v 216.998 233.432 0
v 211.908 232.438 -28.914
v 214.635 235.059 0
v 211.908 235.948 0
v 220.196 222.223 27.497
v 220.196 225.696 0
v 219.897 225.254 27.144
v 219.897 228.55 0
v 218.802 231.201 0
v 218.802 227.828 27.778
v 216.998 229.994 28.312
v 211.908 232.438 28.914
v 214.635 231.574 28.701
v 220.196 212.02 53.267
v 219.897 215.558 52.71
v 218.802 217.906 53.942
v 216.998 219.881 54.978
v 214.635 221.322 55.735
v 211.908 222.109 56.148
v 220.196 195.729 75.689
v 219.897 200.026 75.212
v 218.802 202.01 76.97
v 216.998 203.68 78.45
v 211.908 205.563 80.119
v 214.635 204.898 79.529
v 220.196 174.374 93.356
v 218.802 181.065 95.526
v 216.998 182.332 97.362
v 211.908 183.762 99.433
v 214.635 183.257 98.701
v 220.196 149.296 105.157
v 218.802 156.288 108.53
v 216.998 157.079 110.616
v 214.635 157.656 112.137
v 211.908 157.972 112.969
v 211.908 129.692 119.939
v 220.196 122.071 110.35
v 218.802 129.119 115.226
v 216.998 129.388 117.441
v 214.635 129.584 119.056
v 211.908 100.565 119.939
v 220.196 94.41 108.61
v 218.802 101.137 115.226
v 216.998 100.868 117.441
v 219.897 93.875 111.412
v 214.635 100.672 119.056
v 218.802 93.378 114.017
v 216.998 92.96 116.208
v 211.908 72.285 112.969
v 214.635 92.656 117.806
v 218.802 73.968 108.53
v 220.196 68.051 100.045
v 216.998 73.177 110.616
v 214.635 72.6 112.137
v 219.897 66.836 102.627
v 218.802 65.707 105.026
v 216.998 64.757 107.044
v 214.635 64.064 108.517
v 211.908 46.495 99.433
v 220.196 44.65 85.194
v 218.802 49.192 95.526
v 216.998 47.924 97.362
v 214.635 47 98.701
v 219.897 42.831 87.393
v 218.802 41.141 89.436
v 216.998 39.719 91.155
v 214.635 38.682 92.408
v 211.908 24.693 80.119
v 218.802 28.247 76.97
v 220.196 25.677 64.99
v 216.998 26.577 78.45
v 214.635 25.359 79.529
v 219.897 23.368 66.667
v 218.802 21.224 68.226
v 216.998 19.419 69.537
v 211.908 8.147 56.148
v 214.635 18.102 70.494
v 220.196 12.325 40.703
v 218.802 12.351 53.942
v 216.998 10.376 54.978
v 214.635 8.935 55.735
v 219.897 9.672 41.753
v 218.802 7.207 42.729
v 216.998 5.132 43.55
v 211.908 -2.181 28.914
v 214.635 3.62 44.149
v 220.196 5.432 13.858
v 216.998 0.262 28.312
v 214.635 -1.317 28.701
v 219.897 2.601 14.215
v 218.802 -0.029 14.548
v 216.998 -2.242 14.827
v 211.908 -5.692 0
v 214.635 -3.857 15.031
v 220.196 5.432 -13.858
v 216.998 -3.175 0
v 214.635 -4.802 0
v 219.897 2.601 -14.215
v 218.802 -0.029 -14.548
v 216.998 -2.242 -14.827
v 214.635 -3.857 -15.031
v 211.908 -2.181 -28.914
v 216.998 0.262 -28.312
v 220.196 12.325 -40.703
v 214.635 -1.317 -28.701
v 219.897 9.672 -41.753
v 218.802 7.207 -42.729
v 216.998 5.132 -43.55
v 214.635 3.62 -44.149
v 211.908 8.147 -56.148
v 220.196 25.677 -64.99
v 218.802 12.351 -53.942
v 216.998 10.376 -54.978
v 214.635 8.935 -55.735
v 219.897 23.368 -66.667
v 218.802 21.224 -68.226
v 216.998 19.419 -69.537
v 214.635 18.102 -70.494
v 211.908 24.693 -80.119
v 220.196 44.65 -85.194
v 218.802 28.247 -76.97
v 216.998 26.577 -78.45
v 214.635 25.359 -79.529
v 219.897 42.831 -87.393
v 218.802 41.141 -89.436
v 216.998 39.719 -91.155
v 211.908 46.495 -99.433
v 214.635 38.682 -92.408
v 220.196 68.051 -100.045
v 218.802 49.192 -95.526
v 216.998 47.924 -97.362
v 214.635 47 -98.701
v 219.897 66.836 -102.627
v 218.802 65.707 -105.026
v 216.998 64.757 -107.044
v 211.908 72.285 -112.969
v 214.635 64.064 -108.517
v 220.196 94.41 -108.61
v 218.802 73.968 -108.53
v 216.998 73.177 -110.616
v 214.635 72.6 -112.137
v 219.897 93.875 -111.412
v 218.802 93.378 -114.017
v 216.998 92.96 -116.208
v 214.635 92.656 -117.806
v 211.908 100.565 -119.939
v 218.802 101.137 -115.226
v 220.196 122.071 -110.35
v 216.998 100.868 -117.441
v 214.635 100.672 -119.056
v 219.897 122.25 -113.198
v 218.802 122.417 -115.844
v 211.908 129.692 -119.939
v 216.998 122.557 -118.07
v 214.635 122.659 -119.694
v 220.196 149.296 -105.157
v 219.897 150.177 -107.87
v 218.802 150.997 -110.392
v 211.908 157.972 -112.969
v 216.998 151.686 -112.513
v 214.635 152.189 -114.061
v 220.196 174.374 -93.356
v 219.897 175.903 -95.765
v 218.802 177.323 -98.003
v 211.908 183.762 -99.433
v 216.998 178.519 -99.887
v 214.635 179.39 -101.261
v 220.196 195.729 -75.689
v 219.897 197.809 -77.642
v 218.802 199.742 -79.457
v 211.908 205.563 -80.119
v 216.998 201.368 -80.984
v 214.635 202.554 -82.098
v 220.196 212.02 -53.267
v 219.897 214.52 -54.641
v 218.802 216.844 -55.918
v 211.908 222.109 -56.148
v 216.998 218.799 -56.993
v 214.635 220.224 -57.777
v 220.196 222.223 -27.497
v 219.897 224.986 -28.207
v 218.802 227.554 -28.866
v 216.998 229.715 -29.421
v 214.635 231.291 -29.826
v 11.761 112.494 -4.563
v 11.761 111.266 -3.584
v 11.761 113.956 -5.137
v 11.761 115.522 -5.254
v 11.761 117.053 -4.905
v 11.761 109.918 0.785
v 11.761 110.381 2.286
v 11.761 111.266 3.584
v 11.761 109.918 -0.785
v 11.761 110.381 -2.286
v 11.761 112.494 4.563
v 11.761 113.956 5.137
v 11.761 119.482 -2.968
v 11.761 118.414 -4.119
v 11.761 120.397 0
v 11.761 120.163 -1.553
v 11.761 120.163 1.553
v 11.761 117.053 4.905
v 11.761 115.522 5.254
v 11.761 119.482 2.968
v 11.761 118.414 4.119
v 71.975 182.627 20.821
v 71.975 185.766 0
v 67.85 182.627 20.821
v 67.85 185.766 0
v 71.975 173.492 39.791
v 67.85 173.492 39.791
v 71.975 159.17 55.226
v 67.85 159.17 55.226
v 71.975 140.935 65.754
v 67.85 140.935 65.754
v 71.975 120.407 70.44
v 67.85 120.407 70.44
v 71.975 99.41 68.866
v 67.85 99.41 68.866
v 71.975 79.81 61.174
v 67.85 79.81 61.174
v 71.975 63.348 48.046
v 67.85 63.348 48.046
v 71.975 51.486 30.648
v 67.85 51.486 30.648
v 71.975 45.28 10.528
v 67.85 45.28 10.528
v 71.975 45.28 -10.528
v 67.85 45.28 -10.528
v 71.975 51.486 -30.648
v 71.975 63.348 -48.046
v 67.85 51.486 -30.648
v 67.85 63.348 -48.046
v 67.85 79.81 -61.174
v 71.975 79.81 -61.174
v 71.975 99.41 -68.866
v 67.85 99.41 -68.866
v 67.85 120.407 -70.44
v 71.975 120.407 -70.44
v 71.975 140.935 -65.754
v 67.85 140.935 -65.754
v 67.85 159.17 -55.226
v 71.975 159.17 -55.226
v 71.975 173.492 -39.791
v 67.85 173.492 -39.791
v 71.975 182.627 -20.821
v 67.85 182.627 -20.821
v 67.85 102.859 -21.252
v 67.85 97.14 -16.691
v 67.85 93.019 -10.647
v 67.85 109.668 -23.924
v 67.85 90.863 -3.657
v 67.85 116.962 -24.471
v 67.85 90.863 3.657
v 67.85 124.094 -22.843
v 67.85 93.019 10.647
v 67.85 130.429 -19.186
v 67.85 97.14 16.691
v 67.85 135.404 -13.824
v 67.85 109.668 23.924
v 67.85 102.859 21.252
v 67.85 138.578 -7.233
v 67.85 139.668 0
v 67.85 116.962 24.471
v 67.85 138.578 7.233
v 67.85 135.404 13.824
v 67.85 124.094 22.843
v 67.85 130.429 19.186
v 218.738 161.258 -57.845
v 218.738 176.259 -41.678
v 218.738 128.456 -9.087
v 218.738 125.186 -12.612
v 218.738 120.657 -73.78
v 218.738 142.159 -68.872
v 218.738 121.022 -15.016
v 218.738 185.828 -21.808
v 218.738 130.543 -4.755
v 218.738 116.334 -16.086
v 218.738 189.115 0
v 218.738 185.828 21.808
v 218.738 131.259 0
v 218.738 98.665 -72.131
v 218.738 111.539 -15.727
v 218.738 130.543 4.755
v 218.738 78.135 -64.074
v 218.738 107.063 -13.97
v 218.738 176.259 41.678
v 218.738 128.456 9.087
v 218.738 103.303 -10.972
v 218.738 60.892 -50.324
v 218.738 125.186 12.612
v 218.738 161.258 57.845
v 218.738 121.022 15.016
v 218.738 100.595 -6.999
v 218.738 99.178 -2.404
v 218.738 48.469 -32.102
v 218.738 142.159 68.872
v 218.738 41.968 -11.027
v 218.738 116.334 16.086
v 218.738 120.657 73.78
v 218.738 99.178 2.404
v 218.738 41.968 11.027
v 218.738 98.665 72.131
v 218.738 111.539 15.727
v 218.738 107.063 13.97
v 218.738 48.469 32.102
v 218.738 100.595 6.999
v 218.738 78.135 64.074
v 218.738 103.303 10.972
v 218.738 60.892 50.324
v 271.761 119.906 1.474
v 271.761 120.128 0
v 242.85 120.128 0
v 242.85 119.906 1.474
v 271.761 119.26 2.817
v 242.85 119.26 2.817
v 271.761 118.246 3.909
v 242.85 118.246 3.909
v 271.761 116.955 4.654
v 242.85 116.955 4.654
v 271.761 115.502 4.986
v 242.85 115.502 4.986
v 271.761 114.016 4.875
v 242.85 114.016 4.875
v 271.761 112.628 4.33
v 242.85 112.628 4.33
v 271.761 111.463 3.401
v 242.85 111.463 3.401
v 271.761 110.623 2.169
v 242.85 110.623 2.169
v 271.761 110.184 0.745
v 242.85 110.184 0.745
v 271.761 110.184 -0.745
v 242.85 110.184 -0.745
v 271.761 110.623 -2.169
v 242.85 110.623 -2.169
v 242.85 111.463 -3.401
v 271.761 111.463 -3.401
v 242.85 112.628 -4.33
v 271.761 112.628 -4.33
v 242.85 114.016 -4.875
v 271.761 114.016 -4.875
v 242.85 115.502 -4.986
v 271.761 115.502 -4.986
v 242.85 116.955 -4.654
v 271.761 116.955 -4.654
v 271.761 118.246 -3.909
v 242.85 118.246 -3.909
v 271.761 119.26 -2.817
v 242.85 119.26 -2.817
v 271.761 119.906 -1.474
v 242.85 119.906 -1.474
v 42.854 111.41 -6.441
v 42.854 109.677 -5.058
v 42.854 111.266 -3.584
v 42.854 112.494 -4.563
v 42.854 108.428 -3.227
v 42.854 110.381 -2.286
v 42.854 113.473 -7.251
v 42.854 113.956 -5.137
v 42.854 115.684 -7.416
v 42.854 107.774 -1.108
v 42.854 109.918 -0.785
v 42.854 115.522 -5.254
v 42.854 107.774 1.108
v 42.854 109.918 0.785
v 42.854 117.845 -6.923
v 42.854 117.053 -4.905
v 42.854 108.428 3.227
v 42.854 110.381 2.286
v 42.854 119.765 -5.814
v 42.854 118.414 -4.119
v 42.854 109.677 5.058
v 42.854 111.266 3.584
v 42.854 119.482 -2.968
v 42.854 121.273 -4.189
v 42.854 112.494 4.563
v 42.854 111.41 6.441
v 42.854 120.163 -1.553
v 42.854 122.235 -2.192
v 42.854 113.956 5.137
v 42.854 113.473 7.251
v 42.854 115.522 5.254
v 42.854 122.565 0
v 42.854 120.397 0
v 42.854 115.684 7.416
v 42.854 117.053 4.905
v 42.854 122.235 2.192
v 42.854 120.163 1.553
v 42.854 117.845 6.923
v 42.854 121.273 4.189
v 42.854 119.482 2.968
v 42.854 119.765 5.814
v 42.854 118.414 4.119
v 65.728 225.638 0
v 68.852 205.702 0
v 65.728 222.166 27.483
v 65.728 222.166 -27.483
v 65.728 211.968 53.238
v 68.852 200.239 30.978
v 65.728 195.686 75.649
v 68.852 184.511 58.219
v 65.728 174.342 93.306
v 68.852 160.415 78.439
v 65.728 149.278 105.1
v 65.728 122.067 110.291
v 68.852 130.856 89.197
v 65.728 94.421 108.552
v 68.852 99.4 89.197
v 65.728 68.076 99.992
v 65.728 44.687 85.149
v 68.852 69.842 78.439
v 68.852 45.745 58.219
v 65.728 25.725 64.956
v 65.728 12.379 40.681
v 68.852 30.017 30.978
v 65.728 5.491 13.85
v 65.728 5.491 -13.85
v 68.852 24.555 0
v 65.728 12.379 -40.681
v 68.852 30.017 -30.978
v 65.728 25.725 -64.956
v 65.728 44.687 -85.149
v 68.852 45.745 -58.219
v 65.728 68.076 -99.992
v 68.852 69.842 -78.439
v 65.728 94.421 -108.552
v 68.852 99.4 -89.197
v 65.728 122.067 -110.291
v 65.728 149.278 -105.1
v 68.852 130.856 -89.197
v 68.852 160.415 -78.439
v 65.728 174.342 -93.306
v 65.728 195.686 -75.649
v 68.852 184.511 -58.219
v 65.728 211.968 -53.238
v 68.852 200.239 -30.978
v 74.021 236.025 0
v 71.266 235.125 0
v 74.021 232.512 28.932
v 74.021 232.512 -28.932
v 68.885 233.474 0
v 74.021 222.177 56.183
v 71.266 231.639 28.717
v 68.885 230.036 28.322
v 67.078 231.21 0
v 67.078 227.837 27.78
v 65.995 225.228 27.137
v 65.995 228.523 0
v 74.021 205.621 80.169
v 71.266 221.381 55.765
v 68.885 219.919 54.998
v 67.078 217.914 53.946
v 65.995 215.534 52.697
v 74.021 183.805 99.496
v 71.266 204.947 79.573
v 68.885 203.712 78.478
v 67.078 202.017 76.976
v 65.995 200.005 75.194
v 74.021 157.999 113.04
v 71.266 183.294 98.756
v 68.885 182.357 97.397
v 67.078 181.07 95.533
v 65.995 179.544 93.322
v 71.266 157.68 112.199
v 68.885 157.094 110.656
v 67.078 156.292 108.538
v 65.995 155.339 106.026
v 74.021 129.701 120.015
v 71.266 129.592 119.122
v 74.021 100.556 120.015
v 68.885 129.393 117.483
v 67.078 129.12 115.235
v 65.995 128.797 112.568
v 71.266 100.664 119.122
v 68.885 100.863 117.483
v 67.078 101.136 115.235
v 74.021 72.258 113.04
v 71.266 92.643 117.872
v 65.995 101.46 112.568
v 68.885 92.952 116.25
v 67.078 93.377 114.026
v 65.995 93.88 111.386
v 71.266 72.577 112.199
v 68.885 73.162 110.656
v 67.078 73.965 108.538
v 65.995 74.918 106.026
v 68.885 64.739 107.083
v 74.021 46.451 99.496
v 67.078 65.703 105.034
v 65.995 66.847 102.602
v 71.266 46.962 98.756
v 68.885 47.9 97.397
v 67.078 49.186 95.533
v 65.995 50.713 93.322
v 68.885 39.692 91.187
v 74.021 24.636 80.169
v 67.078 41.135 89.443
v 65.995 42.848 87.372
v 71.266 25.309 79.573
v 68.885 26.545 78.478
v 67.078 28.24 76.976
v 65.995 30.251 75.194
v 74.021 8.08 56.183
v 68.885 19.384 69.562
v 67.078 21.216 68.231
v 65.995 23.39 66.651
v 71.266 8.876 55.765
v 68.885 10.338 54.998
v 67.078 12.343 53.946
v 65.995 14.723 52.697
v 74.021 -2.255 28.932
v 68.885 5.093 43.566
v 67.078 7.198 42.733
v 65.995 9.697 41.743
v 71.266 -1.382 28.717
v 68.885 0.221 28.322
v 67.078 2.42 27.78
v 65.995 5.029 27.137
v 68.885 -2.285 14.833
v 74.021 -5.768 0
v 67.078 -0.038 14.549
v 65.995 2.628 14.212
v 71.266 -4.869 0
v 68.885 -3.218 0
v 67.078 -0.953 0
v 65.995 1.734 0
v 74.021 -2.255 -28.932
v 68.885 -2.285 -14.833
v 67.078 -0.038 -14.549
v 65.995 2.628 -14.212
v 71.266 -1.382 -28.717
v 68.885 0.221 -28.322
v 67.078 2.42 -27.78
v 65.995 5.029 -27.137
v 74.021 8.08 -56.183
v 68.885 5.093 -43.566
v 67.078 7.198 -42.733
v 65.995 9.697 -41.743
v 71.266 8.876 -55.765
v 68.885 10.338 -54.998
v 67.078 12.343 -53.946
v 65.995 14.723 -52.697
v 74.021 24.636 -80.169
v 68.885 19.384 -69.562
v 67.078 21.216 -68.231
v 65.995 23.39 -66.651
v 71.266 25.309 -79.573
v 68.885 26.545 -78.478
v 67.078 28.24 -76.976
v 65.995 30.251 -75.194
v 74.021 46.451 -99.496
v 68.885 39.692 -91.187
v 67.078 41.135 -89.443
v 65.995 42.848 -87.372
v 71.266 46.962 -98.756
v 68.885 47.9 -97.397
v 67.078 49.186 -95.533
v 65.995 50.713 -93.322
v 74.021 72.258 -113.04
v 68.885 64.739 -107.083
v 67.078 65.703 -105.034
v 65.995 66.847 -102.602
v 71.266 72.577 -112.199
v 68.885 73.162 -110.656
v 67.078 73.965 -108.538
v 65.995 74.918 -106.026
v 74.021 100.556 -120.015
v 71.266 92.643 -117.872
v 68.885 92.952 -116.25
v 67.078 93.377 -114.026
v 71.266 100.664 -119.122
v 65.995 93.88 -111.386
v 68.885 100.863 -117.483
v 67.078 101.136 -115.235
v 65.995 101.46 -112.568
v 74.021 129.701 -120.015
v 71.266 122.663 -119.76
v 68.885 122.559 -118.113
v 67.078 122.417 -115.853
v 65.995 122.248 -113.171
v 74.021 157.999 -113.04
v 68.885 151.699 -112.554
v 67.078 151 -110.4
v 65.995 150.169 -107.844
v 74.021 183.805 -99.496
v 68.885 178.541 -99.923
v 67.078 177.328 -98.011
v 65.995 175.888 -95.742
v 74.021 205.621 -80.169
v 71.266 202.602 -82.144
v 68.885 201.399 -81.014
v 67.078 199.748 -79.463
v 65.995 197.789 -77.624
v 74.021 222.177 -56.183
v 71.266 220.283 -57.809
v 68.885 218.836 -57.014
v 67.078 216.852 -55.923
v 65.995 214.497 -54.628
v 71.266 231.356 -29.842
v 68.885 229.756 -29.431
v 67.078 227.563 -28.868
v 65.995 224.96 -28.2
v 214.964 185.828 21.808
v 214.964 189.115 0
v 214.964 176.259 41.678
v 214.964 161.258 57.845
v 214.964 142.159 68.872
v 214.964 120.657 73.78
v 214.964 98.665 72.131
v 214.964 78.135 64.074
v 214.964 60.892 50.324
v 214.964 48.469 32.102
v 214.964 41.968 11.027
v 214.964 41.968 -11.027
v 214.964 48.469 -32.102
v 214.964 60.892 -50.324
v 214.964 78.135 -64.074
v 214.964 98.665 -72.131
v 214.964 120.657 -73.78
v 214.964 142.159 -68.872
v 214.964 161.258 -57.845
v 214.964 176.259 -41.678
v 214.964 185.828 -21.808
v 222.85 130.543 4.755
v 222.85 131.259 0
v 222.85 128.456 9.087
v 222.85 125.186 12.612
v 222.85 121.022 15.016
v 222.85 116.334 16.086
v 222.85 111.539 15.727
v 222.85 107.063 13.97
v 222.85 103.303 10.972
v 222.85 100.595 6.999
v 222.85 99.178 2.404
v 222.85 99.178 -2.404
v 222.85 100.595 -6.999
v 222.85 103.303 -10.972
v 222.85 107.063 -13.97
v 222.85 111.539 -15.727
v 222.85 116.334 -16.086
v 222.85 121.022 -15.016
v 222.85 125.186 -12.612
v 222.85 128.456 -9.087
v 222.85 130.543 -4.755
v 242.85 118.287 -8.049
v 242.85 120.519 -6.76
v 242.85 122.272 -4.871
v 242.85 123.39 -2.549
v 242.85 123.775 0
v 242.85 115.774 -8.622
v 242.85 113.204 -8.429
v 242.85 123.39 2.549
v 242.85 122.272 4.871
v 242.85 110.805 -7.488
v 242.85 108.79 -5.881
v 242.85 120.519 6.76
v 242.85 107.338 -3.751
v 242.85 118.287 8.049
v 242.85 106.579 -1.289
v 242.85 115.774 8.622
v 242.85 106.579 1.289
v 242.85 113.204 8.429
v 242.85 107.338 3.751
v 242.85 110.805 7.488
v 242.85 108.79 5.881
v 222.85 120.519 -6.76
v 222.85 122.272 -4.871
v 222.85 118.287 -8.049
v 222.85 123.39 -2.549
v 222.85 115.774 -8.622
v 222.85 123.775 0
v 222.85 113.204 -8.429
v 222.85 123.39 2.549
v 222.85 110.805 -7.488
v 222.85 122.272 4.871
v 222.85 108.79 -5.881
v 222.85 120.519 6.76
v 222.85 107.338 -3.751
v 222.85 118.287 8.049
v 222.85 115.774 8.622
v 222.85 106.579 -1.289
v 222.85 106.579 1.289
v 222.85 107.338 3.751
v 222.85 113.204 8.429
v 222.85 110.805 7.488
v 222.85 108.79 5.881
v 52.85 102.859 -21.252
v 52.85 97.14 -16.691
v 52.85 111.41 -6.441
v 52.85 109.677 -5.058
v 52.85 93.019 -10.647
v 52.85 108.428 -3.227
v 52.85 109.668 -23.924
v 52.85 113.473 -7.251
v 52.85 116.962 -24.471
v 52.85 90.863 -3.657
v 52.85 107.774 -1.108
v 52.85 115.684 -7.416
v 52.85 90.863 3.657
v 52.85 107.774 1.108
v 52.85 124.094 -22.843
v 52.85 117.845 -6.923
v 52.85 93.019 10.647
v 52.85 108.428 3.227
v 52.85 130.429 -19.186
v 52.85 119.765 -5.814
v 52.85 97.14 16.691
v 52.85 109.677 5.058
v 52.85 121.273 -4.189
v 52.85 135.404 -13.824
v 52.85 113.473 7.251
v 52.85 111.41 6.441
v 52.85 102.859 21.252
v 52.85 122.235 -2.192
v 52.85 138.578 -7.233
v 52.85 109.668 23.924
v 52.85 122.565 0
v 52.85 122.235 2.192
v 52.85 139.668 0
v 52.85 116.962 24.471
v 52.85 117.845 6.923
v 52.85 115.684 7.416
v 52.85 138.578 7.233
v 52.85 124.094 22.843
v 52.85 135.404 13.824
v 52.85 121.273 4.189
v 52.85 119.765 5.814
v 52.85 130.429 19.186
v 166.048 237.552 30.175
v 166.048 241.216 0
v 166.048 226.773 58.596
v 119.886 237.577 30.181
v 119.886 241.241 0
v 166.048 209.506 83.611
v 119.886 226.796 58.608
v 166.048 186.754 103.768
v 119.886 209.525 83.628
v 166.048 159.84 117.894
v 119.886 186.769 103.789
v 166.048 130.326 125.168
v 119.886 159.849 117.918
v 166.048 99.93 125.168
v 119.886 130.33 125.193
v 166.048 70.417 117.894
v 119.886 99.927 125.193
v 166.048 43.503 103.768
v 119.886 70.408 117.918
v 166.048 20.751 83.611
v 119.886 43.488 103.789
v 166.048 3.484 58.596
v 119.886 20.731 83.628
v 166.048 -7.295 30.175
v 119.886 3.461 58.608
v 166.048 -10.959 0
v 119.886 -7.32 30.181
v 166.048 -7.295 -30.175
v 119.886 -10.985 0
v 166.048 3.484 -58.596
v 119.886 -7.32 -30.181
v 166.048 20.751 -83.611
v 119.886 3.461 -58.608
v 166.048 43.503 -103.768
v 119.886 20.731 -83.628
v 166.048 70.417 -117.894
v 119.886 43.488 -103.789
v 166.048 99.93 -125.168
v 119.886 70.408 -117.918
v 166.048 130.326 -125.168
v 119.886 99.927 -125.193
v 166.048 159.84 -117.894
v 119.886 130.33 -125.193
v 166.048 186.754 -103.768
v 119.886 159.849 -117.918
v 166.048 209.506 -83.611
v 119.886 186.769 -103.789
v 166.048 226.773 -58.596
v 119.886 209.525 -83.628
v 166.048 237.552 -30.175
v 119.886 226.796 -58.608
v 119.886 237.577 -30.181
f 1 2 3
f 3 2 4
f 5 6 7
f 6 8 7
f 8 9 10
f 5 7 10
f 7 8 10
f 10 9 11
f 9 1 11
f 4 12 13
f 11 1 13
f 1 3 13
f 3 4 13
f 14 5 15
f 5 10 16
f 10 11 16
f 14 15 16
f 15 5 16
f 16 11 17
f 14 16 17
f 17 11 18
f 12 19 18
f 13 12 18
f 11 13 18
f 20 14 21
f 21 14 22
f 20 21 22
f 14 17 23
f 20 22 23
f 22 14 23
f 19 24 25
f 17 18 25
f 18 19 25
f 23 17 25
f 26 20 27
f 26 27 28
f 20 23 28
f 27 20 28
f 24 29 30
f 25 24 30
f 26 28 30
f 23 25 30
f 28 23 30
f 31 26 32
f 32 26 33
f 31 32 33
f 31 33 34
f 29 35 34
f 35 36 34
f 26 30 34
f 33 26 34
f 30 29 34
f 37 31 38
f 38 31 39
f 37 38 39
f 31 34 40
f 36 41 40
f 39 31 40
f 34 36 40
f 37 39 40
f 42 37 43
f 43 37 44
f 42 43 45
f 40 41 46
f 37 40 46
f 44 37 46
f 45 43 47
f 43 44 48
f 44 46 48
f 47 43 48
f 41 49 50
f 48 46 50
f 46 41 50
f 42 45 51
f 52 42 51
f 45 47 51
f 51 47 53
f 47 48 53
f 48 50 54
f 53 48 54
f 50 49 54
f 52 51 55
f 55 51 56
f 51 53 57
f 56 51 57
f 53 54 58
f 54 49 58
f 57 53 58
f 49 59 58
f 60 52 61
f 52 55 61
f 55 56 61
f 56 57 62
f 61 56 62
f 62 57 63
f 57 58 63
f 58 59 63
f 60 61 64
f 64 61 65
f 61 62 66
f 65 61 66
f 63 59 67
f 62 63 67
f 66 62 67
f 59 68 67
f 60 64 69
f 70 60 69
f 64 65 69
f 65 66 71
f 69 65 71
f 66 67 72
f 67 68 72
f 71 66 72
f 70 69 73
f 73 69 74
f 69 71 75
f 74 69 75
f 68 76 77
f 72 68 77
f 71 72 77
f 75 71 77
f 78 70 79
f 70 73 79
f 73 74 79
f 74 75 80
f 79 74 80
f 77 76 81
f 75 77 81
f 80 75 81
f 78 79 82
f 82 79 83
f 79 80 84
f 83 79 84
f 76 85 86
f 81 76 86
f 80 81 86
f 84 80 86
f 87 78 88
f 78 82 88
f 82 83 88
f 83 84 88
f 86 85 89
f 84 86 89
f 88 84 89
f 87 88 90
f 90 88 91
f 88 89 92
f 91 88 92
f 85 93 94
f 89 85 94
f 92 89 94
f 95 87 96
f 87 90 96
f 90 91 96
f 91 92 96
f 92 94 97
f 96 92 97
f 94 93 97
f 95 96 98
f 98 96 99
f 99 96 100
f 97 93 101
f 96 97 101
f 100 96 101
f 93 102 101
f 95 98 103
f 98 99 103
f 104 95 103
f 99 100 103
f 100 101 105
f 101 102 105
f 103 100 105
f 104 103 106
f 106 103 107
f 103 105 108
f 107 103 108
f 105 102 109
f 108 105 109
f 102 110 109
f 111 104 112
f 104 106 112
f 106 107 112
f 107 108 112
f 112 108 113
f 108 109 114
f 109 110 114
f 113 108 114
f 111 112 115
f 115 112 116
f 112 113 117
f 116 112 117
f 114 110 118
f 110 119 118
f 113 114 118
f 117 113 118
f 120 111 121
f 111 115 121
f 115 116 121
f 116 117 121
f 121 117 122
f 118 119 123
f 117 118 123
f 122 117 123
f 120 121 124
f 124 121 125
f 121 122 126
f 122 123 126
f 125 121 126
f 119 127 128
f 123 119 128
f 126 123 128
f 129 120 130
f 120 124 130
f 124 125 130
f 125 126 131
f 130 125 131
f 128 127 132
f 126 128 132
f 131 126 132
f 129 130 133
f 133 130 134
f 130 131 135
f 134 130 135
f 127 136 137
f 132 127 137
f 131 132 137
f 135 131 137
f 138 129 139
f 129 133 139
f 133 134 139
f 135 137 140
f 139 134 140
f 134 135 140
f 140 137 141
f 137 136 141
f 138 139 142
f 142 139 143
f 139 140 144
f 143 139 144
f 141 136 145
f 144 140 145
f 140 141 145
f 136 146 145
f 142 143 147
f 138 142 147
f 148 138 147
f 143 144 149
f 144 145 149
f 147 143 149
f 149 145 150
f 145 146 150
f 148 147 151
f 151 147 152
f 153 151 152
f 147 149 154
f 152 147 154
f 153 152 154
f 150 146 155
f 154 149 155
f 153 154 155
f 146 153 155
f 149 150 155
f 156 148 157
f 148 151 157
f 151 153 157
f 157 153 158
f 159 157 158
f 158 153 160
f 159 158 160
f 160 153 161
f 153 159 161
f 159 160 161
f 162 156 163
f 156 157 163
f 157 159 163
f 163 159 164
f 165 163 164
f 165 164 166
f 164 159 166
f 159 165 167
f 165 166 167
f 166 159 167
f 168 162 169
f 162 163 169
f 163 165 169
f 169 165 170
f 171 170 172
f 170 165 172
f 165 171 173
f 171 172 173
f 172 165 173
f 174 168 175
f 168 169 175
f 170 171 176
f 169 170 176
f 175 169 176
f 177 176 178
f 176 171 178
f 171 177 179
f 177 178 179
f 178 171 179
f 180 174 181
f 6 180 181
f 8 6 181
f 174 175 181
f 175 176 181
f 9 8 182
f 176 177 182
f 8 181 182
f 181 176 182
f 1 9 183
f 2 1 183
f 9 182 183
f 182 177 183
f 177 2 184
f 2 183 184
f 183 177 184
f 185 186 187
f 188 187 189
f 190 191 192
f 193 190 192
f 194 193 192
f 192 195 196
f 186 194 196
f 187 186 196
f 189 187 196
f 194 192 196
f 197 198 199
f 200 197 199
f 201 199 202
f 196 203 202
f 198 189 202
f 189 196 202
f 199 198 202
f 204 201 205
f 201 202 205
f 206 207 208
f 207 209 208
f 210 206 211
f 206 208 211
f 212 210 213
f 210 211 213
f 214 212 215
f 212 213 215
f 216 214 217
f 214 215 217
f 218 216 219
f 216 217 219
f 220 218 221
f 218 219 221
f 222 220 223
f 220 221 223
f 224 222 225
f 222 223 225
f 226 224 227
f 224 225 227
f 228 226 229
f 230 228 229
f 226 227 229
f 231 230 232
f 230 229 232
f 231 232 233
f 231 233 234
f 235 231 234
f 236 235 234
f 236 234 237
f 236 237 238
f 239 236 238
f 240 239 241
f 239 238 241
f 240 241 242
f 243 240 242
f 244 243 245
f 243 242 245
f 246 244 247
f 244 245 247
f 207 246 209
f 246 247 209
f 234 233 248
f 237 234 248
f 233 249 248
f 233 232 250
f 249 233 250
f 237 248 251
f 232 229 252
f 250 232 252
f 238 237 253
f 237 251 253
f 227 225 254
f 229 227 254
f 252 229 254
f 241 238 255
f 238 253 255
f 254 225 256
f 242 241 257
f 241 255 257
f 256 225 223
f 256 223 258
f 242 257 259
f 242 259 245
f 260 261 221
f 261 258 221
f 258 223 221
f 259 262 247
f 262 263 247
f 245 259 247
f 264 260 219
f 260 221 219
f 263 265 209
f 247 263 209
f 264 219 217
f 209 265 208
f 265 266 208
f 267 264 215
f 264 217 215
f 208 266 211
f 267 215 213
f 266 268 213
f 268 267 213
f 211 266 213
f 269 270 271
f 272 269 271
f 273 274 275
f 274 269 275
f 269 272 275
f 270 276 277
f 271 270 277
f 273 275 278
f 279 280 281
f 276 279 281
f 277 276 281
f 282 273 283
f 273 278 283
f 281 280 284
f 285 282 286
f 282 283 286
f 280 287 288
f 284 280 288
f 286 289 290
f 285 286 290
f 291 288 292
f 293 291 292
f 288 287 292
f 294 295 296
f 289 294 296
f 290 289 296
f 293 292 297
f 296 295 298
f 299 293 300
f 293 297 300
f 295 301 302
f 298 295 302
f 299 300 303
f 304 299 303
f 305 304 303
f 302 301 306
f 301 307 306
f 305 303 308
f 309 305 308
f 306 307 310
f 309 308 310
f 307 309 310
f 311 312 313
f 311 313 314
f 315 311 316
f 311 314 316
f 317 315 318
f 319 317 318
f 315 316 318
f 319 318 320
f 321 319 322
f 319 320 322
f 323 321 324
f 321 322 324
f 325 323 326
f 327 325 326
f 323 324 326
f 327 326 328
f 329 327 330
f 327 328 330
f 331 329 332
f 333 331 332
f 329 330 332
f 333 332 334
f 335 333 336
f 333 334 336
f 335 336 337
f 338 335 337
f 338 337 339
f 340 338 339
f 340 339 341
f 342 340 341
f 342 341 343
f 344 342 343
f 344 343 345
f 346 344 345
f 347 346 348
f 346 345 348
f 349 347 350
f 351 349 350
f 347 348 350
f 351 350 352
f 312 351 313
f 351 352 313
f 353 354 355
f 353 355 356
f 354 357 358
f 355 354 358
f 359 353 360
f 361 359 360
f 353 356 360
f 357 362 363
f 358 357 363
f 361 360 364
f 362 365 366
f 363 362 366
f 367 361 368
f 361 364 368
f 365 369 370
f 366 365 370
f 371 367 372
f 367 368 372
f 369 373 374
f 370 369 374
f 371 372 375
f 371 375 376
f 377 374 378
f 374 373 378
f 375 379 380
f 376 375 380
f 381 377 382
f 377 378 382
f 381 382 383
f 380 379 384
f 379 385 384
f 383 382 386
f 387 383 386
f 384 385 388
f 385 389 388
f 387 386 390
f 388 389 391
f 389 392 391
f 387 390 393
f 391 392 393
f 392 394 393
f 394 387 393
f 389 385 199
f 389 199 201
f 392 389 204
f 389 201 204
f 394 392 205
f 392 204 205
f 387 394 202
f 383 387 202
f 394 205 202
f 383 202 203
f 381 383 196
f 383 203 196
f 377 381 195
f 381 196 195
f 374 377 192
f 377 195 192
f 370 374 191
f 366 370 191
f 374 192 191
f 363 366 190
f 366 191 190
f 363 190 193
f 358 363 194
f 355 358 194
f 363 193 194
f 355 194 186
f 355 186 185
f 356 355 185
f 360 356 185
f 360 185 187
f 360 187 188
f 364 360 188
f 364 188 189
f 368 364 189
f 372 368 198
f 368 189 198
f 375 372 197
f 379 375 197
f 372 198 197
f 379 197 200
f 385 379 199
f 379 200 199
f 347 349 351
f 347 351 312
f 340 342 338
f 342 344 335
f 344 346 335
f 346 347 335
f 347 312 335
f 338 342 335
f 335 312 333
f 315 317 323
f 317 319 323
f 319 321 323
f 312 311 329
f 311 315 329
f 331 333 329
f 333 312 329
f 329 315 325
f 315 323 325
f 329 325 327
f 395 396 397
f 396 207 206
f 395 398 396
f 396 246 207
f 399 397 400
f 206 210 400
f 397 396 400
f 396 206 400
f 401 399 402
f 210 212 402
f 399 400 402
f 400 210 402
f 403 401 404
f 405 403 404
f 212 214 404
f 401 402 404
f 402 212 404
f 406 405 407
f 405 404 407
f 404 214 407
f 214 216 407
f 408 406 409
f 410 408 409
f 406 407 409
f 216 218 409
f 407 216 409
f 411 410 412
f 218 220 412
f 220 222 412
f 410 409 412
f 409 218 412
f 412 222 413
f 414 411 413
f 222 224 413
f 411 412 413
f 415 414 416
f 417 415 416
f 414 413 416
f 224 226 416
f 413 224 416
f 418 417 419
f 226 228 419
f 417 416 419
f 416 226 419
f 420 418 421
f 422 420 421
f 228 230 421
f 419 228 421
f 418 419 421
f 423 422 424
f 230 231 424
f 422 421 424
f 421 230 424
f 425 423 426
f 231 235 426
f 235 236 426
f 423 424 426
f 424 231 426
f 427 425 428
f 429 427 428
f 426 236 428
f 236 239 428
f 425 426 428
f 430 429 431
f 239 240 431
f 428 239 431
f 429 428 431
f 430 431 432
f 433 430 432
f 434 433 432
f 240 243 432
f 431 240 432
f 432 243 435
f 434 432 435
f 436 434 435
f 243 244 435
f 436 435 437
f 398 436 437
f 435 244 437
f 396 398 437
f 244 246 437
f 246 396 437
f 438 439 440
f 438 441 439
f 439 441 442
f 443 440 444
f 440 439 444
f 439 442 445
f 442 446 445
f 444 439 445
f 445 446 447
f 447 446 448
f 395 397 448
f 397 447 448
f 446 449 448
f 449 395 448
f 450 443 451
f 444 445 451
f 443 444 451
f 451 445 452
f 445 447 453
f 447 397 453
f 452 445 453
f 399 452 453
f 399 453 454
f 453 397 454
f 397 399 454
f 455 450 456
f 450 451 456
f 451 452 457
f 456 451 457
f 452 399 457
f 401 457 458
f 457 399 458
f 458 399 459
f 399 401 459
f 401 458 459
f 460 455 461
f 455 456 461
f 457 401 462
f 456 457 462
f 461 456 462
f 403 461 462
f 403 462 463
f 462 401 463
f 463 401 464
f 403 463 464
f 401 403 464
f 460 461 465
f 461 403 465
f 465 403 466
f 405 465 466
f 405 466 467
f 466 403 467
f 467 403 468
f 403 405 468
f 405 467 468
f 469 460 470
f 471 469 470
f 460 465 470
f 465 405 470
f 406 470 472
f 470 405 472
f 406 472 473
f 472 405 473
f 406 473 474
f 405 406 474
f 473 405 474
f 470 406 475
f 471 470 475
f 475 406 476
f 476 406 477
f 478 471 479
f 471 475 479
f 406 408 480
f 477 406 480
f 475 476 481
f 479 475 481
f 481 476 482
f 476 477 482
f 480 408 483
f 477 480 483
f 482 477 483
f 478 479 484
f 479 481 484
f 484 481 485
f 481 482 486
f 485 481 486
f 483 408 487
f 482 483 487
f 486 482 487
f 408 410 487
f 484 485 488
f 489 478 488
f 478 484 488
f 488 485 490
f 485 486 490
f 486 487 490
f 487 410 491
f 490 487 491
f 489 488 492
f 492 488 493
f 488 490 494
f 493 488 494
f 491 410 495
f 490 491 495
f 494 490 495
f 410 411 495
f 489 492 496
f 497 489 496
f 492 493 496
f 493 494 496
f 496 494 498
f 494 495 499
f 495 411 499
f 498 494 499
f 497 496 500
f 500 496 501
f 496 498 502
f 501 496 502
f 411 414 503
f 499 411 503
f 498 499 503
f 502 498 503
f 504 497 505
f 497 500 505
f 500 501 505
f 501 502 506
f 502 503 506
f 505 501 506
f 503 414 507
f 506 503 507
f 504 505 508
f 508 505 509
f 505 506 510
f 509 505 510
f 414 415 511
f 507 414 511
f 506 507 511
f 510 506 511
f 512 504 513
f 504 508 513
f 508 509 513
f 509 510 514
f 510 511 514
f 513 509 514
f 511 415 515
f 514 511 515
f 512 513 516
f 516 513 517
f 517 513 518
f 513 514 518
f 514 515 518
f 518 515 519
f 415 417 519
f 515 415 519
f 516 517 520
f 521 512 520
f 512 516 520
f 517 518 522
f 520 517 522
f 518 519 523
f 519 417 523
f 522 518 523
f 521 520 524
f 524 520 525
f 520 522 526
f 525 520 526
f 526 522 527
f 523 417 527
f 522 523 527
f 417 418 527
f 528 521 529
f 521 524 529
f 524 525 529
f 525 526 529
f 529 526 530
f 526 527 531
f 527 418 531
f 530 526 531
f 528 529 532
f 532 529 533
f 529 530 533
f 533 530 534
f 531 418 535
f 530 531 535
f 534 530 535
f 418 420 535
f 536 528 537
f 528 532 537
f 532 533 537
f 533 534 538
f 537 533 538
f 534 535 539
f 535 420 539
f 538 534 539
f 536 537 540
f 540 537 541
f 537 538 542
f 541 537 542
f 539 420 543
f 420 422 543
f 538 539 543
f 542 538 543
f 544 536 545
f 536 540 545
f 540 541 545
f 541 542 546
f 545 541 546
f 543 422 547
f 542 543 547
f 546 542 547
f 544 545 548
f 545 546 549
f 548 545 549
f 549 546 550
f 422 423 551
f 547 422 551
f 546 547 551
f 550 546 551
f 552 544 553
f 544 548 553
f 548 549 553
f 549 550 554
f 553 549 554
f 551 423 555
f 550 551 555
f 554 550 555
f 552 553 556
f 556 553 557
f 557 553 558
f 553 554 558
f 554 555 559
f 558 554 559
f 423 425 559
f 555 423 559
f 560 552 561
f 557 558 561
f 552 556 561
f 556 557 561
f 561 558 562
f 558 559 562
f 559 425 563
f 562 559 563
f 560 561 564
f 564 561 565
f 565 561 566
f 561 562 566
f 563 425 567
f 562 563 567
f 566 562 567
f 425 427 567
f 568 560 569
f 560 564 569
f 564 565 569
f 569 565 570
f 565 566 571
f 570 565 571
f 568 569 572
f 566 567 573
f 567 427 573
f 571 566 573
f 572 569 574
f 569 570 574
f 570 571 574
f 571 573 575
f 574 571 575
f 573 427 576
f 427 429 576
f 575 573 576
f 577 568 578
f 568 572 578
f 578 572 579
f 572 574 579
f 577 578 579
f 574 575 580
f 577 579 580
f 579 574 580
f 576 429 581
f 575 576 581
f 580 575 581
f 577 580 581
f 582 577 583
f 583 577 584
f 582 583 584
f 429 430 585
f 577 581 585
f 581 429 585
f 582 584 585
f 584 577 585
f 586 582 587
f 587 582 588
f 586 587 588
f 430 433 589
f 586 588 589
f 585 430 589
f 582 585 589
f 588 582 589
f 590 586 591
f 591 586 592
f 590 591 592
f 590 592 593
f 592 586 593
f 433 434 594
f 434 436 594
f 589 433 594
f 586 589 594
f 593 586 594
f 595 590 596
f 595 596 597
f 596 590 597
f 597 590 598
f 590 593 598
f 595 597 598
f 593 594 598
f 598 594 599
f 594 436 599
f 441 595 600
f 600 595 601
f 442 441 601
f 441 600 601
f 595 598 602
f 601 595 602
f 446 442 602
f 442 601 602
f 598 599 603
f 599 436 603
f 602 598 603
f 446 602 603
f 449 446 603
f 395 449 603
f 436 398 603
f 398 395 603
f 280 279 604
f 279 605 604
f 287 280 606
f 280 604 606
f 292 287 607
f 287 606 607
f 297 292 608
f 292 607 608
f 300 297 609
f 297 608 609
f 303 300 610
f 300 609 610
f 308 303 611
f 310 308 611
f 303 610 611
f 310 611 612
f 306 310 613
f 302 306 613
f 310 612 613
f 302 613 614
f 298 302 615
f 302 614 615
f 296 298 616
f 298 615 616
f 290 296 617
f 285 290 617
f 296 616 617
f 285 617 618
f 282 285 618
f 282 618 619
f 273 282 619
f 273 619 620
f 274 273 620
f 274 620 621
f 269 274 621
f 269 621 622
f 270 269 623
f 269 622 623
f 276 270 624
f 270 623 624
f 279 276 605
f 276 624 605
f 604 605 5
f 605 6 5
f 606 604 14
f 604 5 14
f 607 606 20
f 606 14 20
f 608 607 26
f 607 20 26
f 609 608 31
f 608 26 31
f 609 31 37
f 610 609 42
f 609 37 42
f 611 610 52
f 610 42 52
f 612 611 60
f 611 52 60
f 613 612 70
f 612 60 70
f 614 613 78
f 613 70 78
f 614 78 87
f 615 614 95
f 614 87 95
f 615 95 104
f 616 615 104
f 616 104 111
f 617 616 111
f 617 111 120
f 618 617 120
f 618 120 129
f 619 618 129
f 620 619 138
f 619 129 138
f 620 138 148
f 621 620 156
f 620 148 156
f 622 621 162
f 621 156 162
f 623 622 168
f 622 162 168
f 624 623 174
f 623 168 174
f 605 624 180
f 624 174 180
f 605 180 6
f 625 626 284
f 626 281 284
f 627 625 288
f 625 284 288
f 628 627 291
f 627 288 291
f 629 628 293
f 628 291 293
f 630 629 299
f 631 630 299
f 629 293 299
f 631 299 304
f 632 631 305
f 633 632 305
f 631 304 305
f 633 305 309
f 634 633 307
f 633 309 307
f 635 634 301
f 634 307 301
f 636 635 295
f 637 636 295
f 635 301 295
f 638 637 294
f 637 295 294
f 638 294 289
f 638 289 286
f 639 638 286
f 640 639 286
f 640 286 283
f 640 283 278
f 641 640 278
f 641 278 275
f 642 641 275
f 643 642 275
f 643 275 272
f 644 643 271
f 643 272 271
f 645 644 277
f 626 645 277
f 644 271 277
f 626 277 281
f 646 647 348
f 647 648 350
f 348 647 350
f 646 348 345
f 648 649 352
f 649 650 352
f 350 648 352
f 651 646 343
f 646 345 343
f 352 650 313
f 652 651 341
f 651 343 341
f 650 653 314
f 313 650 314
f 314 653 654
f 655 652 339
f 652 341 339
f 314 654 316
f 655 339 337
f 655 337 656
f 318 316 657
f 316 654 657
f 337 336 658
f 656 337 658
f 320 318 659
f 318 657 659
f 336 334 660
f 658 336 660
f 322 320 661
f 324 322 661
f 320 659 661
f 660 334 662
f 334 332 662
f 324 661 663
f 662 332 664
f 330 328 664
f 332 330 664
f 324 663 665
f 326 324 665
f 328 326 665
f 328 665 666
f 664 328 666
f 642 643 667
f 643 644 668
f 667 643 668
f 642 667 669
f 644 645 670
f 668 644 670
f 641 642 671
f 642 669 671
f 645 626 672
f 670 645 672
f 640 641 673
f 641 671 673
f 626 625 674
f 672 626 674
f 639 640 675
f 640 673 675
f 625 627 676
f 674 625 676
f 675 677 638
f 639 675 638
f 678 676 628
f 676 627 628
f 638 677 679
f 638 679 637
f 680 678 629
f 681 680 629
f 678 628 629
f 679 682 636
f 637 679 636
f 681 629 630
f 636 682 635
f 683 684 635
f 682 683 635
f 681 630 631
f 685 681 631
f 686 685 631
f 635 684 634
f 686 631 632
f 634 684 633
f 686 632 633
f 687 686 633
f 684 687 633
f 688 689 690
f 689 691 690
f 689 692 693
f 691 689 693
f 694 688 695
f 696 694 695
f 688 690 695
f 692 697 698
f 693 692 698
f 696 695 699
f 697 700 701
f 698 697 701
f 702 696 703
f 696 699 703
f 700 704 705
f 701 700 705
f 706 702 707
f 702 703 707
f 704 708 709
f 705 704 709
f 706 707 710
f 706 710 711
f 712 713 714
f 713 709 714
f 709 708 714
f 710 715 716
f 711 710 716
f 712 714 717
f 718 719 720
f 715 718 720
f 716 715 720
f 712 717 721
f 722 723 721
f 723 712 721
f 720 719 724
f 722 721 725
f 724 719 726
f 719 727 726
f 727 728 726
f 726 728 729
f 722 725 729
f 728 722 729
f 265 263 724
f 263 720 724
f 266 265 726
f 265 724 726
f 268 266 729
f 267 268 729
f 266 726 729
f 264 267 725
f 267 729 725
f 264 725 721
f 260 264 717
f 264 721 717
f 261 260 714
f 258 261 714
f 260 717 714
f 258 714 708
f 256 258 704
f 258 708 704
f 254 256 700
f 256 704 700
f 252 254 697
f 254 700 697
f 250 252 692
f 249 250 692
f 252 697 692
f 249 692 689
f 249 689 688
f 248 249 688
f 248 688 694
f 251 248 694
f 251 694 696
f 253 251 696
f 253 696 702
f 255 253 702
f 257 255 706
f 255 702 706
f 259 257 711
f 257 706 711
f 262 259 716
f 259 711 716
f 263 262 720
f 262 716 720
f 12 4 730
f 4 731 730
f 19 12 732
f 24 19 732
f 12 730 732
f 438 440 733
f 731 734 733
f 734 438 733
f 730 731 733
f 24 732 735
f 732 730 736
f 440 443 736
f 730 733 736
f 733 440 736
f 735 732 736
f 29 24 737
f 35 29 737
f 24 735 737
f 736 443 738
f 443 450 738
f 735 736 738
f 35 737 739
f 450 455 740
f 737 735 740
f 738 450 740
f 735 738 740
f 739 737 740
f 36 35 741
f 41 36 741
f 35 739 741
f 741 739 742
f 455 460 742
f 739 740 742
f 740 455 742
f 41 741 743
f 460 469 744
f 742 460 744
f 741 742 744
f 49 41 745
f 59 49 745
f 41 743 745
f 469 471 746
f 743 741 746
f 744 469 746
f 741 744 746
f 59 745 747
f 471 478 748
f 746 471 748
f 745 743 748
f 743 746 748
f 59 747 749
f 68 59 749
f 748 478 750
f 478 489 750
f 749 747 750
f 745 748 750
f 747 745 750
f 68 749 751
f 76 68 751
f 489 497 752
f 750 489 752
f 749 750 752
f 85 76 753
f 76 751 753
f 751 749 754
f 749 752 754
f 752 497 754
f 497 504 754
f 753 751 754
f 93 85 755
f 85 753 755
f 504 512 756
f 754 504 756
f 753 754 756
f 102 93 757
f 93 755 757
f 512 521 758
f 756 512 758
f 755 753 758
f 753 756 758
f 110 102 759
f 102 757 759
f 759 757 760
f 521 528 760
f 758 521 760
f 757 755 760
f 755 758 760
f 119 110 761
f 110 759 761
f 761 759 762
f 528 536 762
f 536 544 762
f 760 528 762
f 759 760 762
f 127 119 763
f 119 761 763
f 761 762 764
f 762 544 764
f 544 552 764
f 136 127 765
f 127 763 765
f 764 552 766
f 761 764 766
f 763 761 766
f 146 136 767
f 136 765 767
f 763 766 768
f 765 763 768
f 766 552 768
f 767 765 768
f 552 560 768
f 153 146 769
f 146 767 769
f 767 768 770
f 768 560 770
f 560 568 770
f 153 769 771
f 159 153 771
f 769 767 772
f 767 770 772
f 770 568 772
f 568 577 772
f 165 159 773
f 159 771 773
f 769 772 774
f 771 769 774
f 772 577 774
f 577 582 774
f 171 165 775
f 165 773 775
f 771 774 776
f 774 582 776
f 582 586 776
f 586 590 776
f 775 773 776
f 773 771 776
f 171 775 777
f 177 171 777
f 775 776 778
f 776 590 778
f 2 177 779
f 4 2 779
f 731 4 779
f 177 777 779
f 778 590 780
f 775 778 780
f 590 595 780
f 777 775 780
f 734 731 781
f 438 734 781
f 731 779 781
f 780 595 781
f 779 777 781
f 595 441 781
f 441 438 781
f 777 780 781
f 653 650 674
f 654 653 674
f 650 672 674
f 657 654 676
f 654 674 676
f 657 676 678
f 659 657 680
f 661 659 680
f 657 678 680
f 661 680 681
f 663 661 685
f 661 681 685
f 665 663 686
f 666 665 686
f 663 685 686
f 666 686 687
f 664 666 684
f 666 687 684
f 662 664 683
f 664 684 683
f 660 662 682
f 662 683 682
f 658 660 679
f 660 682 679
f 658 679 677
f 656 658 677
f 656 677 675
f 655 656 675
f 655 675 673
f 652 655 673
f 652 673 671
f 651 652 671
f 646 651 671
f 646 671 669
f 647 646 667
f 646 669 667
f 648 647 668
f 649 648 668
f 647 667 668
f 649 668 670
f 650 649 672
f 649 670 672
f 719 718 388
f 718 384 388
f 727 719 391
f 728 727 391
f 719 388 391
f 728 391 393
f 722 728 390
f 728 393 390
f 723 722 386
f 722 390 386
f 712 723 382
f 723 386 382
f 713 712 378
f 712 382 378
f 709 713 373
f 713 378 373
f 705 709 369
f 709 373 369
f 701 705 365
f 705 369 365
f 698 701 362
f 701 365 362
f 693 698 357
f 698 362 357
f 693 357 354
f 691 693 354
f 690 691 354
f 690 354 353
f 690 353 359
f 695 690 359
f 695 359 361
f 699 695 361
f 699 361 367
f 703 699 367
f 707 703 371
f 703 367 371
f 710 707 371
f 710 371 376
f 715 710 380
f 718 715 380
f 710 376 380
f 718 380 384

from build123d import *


with BuildPart() as f1:
    # F0 (on Top) → F1 (revolve)
    with BuildSketch(Plane.XY):
        with BuildLine():
            Line((11.76144, 120.397367), (11.76144, 115.128331))
            Line((11.76144, 115.128331), (271.76144, 115.128331))
            Line((271.76144, 115.128331), (271.76144, 120.128331))
            Line((271.76144, 120.128331), (242.850471, 120.128331))
            Line((242.850471, 120.128331), (242.850471, 123.77452))
            Line((242.850471, 123.77452), (222.850471, 123.77452))
            Line((222.850471, 123.77452), (222.850471, 131.259307))
            Line((222.850471, 131.259307), (218.737677, 131.259307))
            Line((218.737677, 131.259307), (218.737677, 189.114824))
            Line((218.737677, 189.114824), (214.96439, 189.114824))
            Line((214.96439, 189.114824), (220.195598, 225.696488))
            ThreePointArc((220.195598, 225.696488), (217.980175, 232.381506), (211.907725, 235.948427))
            ThreePointArc((211.907725, 235.948427), (142.967514, 241.885279), (74.020783, 236.024629))
            ThreePointArc((74.020783, 236.024629), (67.899117, 232.408126), (65.728222, 225.637521))
            Line((65.728222, 225.637521), (71.974896, 185.76562))
            Line((71.974896, 185.76562), (67.850471, 185.76562))
            Line((67.850471, 185.76562), (67.850471, 139.667943))
            Line((67.850471, 139.667943), (52.850471, 139.667943))
            Line((52.850471, 139.667943), (52.850471, 122.565307))
            Line((52.850471, 122.565307), (42.854126, 122.565307))
            Line((42.854126, 122.565307), (42.854126, 120.397367))
            Line((42.854126, 120.397367), (11.76144, 120.397367))
        make_face()
    revolve(axis=Axis((141.76144, 115.128331, 0), (1, 0, 0)))


solid = f1.part
